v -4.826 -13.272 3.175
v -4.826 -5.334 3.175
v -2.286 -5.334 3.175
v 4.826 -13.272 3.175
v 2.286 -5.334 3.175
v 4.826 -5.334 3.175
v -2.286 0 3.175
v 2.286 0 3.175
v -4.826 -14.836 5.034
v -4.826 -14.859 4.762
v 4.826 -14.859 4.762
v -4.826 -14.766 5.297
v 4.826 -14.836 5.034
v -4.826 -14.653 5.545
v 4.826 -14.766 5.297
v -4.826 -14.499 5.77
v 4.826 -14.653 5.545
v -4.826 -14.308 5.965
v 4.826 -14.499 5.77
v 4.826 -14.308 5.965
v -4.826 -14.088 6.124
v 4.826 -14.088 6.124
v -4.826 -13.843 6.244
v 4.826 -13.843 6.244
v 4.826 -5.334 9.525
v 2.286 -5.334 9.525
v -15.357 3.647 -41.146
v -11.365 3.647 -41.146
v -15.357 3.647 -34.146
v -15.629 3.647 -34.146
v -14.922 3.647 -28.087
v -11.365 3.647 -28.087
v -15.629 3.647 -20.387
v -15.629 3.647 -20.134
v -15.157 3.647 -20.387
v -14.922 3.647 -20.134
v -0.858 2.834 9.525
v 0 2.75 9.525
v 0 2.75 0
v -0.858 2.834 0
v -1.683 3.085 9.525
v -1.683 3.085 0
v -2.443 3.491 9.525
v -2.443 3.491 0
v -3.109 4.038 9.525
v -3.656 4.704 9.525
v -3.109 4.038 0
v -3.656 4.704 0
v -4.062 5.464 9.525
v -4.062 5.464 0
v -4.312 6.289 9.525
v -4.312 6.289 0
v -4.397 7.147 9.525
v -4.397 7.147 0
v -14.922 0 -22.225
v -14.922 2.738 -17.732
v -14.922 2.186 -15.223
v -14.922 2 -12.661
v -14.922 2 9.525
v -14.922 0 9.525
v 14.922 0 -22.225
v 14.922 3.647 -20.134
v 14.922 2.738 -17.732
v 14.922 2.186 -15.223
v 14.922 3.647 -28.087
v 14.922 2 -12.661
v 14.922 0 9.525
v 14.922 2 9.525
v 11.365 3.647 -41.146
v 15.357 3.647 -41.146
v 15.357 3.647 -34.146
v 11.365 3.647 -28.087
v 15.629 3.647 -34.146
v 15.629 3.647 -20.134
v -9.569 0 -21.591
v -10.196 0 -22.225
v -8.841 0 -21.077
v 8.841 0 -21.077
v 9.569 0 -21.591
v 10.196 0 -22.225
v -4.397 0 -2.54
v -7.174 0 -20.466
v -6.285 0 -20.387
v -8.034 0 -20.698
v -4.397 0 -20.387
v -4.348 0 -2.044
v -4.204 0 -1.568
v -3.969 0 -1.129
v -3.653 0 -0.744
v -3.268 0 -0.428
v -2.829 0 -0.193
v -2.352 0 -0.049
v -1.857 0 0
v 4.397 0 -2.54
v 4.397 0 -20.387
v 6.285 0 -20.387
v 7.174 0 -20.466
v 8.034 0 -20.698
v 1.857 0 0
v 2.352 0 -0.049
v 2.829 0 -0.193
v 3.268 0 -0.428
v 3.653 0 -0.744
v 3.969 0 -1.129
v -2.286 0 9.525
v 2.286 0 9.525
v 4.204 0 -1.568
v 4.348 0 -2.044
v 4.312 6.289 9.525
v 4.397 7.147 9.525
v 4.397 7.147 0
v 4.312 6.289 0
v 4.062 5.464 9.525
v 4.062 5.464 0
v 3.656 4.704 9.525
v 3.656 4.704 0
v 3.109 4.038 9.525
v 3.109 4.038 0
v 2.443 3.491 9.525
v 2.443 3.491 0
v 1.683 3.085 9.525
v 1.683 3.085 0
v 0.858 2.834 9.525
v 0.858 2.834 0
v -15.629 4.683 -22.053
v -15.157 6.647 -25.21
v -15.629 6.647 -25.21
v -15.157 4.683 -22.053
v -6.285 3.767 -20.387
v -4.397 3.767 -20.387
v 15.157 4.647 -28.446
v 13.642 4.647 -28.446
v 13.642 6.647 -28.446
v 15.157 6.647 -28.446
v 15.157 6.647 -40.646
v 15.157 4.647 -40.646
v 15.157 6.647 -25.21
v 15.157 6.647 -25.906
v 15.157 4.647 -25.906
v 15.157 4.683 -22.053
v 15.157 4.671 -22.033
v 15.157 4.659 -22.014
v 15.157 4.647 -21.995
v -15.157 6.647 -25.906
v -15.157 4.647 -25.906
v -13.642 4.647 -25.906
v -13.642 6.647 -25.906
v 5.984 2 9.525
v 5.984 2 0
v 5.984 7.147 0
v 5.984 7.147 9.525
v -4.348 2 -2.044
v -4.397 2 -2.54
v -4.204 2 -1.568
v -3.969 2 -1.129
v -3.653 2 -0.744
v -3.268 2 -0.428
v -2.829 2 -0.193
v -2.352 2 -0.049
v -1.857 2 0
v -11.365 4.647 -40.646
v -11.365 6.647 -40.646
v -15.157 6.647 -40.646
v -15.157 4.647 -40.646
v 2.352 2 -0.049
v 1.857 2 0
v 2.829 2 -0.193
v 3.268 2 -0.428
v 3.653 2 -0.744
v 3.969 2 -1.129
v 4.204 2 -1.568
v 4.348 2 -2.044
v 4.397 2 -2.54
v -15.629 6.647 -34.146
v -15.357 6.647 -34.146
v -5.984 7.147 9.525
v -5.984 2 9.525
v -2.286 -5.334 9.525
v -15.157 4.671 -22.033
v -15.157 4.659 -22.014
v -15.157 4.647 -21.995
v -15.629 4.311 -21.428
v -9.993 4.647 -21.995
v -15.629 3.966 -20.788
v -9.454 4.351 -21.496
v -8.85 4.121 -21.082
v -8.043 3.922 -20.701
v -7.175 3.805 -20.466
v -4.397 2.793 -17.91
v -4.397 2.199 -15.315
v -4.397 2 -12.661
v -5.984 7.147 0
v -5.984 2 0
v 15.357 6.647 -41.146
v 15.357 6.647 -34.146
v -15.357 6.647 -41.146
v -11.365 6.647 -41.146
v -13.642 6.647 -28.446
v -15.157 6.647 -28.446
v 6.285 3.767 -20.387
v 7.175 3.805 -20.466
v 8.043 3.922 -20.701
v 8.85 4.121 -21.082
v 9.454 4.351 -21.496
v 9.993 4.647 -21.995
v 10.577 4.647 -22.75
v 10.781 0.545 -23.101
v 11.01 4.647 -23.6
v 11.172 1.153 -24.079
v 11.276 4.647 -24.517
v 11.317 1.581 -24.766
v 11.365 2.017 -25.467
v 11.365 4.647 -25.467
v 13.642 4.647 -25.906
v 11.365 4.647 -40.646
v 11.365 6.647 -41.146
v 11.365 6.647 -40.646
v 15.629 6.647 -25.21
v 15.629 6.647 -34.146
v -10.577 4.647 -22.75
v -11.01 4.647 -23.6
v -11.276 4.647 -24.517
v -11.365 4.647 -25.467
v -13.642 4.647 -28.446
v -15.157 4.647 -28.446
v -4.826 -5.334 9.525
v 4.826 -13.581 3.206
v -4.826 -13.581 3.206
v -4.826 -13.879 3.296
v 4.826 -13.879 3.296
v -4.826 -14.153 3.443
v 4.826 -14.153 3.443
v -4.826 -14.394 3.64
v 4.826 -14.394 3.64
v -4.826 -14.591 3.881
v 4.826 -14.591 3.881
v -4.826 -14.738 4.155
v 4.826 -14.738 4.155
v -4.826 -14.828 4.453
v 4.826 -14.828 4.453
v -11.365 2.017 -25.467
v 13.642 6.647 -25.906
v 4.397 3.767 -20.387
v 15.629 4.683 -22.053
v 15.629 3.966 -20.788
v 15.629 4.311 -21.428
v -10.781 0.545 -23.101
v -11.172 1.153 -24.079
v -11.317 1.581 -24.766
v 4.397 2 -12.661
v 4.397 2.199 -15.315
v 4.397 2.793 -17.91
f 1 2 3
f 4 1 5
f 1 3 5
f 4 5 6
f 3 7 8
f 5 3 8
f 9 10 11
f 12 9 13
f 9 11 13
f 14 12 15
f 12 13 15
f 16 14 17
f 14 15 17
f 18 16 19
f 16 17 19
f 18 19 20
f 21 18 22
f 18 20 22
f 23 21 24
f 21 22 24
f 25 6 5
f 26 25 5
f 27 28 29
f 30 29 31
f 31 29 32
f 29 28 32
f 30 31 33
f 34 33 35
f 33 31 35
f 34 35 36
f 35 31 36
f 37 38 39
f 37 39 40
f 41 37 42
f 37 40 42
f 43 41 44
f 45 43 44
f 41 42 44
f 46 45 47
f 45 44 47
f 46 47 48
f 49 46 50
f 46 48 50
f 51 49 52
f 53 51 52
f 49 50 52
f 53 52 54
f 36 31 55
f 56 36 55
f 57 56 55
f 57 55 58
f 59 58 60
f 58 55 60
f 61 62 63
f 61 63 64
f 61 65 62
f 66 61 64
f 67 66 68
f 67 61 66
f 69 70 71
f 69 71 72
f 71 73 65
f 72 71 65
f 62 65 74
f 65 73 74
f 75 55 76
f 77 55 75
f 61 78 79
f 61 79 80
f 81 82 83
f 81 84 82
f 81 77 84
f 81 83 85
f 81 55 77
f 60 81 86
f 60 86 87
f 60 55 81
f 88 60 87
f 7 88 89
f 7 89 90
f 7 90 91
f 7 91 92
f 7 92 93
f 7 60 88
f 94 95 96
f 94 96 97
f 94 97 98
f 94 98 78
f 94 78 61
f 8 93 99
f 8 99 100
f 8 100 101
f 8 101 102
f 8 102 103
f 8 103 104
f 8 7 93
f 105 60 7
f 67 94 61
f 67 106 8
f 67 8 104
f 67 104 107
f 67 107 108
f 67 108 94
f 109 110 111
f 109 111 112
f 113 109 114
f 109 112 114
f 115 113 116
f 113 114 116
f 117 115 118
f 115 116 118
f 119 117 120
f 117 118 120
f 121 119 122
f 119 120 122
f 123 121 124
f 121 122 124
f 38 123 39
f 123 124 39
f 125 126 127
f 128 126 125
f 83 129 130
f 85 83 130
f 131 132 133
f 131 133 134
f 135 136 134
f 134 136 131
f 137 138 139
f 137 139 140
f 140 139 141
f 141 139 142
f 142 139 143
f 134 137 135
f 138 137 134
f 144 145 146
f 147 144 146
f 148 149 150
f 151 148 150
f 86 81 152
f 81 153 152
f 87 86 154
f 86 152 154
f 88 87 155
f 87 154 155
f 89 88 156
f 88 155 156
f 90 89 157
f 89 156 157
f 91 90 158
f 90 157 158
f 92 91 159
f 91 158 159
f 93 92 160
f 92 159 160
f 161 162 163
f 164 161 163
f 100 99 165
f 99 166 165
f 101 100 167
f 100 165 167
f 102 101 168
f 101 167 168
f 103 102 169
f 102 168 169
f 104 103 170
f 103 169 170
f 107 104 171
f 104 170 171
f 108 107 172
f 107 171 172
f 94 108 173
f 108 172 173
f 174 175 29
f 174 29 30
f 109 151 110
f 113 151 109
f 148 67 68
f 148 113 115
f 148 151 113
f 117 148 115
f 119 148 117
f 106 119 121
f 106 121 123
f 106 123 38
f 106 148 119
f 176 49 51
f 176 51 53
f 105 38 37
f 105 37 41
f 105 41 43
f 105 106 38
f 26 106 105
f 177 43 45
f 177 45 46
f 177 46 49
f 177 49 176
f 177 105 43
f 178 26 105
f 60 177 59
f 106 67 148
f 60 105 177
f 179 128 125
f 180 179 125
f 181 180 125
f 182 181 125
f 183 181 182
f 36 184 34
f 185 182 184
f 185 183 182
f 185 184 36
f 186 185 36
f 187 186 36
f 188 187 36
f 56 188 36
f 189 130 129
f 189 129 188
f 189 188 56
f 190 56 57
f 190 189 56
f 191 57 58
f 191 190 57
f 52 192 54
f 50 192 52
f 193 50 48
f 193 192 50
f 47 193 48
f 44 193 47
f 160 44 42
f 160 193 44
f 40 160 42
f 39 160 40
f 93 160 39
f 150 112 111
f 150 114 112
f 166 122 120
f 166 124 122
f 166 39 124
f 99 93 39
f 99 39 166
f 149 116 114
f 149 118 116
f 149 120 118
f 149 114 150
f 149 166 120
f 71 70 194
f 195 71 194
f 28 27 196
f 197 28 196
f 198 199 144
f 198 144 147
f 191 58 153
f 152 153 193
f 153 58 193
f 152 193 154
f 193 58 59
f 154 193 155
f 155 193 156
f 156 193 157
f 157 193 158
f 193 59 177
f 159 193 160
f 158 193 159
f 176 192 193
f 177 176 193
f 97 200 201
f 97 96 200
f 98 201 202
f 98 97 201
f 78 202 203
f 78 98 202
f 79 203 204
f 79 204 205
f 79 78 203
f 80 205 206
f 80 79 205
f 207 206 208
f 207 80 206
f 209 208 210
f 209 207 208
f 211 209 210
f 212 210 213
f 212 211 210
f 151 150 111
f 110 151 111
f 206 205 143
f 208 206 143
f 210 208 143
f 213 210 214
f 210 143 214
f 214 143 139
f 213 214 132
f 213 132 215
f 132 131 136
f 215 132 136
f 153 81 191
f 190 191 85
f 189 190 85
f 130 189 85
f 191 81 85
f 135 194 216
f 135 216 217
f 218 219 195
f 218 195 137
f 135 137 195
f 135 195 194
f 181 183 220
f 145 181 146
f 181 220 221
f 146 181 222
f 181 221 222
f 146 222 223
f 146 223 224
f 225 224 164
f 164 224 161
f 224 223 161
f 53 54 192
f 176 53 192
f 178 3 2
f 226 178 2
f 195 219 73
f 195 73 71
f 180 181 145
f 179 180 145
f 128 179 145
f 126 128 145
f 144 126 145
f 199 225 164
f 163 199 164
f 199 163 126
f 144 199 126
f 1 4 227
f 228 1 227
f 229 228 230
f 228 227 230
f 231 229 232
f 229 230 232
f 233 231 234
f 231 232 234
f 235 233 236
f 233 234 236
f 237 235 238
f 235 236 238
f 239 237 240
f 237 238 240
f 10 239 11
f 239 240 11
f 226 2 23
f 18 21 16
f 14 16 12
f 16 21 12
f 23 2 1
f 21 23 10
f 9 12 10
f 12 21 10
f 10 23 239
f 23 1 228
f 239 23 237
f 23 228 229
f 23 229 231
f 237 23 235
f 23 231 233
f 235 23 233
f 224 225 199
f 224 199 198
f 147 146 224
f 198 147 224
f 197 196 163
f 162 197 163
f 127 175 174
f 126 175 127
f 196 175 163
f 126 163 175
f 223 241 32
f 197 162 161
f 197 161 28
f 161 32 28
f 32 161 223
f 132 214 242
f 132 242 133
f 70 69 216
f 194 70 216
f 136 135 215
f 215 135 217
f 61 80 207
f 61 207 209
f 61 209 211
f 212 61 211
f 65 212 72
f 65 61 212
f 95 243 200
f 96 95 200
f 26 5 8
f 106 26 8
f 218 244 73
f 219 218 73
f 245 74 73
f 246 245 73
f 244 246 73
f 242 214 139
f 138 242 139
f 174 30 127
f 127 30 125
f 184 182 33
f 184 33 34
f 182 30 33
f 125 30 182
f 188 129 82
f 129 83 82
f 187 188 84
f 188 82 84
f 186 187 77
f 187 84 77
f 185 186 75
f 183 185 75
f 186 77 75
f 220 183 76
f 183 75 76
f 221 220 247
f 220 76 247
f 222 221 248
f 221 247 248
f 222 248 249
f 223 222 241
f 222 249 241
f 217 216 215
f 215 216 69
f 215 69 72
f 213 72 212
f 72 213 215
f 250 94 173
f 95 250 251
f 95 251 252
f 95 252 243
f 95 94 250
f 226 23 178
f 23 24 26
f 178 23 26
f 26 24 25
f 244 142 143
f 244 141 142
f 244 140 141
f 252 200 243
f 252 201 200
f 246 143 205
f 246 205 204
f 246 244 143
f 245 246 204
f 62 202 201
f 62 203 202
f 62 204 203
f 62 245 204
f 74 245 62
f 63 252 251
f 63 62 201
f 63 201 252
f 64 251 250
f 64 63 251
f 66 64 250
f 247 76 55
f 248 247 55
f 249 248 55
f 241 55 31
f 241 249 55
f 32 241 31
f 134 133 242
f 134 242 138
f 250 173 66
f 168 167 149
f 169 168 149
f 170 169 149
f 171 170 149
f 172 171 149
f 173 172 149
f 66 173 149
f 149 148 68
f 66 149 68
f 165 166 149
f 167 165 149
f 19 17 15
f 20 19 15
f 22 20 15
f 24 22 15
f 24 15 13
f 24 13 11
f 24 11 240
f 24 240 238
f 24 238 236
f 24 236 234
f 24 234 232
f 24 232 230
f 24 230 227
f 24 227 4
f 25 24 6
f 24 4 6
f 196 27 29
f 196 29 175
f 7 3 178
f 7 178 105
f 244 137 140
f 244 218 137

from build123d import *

# Parameters (mm, degrees)
SKETCH2_W               = 11.9687594
SKETCH2_H               = 2.75
BOSS_EXTRUDE1_DEPTH     = 9.525
BOSS_EXTRUDE2_START     = 3.175
SKETCH2_3_W             = 11.9687594
SKETCH2_3_H             = 2.75
SKETCH2_3_W_2           = 4.572
SKETCH2_3_H_2           = 5.334
BOSS_EXTRUDE2_DEPTH     = 6.35
BOSS_EXTRUDE3_DEPTH     = 2
BOSS_EXTRUDE7_DEPTH     = 25.4
SKETCH5_W               = 9.771111266
SKETCH5_H               = 3
CUT_EXTRUDE1_DEPTH      = 78.484078326
SKETCH6_W               = 30.314979468
SKETCH6_H               = 2.000002
SKETCH6_W_2             = 22.73097918
SKETCH6_H_2             = 6.646875
CUT_EXTRUDE2_DEPTH      = 20.258872
CUT_EXTRUDE3_START      = 0.499999
SKETCH6_3_W             = 22.73097918
SKETCH6_3_H             = 2.000002
SKETCH6_3_H_2           = 4.646873
SKETCH6_3_W_2           = 0.271399
SKETCH6_3_H_3           = 3
CUT_EXTRUDE3_DEPTH      = 7.0000114
FILLET2_R               = 17.78
CUT_EXTRUDE4_DEPTH      = 48.132860149
CUT_EXTRUDE4_DEPTH_BACK = 48.132860149
SKETCH7_W               = 8.7937594
SKETCH7_H               = 20.387434944
FILLET3_R               = 2.54
SKETCH8_W               = 1.515000072
SKETCH8_H               = 2.54
BOSS_EXTRUDE8_DEPTH     = 2
FILLET4_R               = 5.08
CUT_EXTRUDE5_DEPTH      = 49.292968639


with BuildPart() as part:
    # Sketch2 → Boss-Extrude1 (new body)
    with BuildSketch(Plane.XY):
        with BuildLine():
            ThreePointArc((-9e-09, 2.75), (-3.109063455, 4.037816251), (-4.3968797, 7.1468797))
            Line((-4.3968797, 7.1468797), (-5.9843797, 7.1468797))
            Line((-5.9843797, 7.1468797), (-5.9843797, 2.75))
            Line((-5.9843797, 2.75), (-9e-09, 2.75))
        make_face()
        with BuildLine():
            Line((5.9843797, 7.1468797), (4.3968797, 7.1468797))
            ThreePointArc((4.3968797, 7.1468797), (3.109063449, 4.037816245), (-9e-09, 2.75))
            Line((-9e-09, 2.75), (5.9843797, 2.75))
            Line((5.9843797, 2.75), (5.9843797, 7.1468797))
        make_face()
        with Locations((0, 1.375)):
            Rectangle(SKETCH2_W, SKETCH2_H)
    extrude(amount=BOSS_EXTRUDE1_DEPTH)

    # Sketch2<3> → Boss-Extrude2 (add)
    with BuildSketch(Plane.XY.offset(BOSS_EXTRUDE2_START)):
        with Locations((0, 1.375)):
            Rectangle(SKETCH2_3_W, SKETCH2_3_H)
        with BuildLine():
            ThreePointArc((-9e-09, 2.75), (-3.109063455, 4.037816251), (-4.3968797, 7.1468797))
            Line((-4.3968797, 7.1468797), (-5.9843797, 7.1468797))
            Line((-5.9843797, 7.1468797), (-5.9843797, 2.75))
            Line((-5.9843797, 2.75), (-9e-09, 2.75))
        make_face()
        with BuildLine():
            Line((5.9843797, 7.1468797), (4.3968797, 7.1468797))
            ThreePointArc((4.3968797, 7.1468797), (3.109063449, 4.037816245), (-9e-09, 2.75))
            Line((-9e-09, 2.75), (5.9843797, 2.75))
            Line((5.9843797, 2.75), (5.9843797, 7.1468797))
        make_face()
        with Locations((0, -2.667)):
            Rectangle(SKETCH2_3_W_2, SKETCH2_3_H_2)
        Polygon((2.286, -5.334), (-2.286, -5.334), (-4.826, -5.334), (-4.826, -14.859), (4.826, -14.859), (4.826, -5.334), align=None)
    extrude(amount=BOSS_EXTRUDE2_DEPTH)

    # Sketch3 → Boss-Extrude3 (add)
    with BuildSketch(Plane.XZ):
        Polygon((14.9225, 9.525), (-14.9225, 9.525), (-14.9225, -22.225), (-10.85748959, -22.225), (10.85748959, -22.225), (14.9225, -22.225), align=None)
    extrude(amount=-BOSS_EXTRUDE3_DEPTH)

    # Sketch4<6> → Boss-Extrude7 (add, symmetric)
    with BuildSketch(Plane(origin=(0, 0, 0), x_dir=(0, 0, -1), z_dir=(1, 0, 0))):
        Polygon((28.087296632, 3.646875), (41.146305566, 3.646875), (41.146305566, 6.646875), (25.209889757, 6.646875), (17.740108187, 2), (22.225, 0), align=None)
    extrude(amount=BOSS_EXTRUDE7_DEPTH, both=True)

    # Sketch5 → Cut-Extrude1 (cut, through all)
    with BuildSketch(Plane(origin=(0, 37.971305566, -41.146305566), x_dir=(1, 0, 0), z_dir=(0, 0, 1))):
        Polygon((25.4, -37.971305566), (25.4, -34.324430566), (15.628888734, -34.324430566), (14.9225, -34.324430566), (14.9225, -37.971305566), align=None)
        with Locations((20.514444367, -32.824430566)):
            Rectangle(SKETCH5_W, SKETCH5_H)
        Polygon((-25.4, -34.324430566), (-25.4, -37.971305566), (-14.9225, -37.971305566), (-14.9225, -34.324430566), (-15.628888734, -34.324430566), align=None)
        with Locations((-20.514444367, -32.824430566)):
            Rectangle(SKETCH5_W, SKETCH5_H)
    extrude(amount=CUT_EXTRUDE1_DEPTH, mode=Mode.SUBTRACT)

    # Sketch6 → Cut-Extrude2 (cut)
    with BuildSketch(Plane(origin=(0, 0, -40.646306566), x_dir=(-1, 0, 0), z_dir=(0, 0, -1))):
        with Locations((0, 5.646874)):
            Rectangle(SKETCH6_W, SKETCH6_H)
        with Locations((0, 3.3234375)):
            Rectangle(SKETCH6_W_2, SKETCH6_H_2)
    extrude(amount=-CUT_EXTRUDE2_DEPTH, mode=Mode.SUBTRACT)

    # Sketch6<3> → Cut-Extrude3 (cut)
    with BuildSketch(Plane(origin=(0, 0, -40.646306566), x_dir=(-1, 0, 0), z_dir=(0, 0, -1)).offset(CUT_EXTRUDE3_START)):
        with Locations((0, 5.646874)):
            Rectangle(SKETCH6_3_W, SKETCH6_3_H)
        with Locations((0, 2.3234365)):
            Rectangle(SKETCH6_3_W, SKETCH6_3_H_2)
        with Locations((-15.493189234, 5.146875)):
            Rectangle(SKETCH6_3_W_2, SKETCH6_3_H_3)
        with Locations((15.493189234, 5.146875)):
            Rectangle(SKETCH6_3_W_2, SKETCH6_3_H_3)
    extrude(amount=-CUT_EXTRUDE3_DEPTH, mode=Mode.SUBTRACT)

    # Fillet2
    # the kernel refuses this fillet: 17.78 mm, written as the material it adds along each edge
    with BuildSketch(Plane(origin=(27.620205217, 2, -17.740108187), x_dir=(0, 0.5282208325858079, -0.8491070321357349), z_dir=(-1, 0, 0))) as fillet2_piece_1_section:
        with BuildLine():
            CenterArc((FILLET2_R * 0.285662659546, -FILLET2_R), FILLET2_R, 90, 31.885322289)
            Line((-FILLET2_R * 0.242558173039, -FILLET2_R * 0.150892967864), (0, 0))
            Line((0, 0), (FILLET2_R * 0.285662659546, 0))
        make_face()
    fillet2_piece_1 = extrude(amount=55.240410434, mode=Mode.PRIVATE)
    fillet2_piece_1 = split(fillet2_piece_1, bisect_by=Plane(origin=(15.393189234, 3.646875, -22.00929754), z_dir=(0, 1, 0)), keep=Keep.TOP, mode=Mode.PRIVATE)
    fillet2_piece_1 = split(fillet2_piece_1, bisect_by=Plane(origin=(15.628888734, 4.655865618, -22.00929754), z_dir=(-1, 0, 0)), keep=Keep.TOP, mode=Mode.PRIVATE)
    fillet2_piece_1 = split(fillet2_piece_1, bisect_by=Plane(origin=(15.157489734, 4.655865618, -22.00929754), z_dir=(1, 0, 0)), keep=Keep.TOP, mode=Mode.PRIVATE)
    add(fillet2_piece_1)
    with BuildSketch(Plane(origin=(27.620205217, 2, -17.740108187), x_dir=(0, 0.5282208325858079, -0.8491070321357349), z_dir=(-1, 0, 0))) as fillet2_piece_2_section:
        with BuildLine():
            CenterArc((FILLET2_R * 0.285662659546, -FILLET2_R), FILLET2_R, 90, 31.885322289)
            Line((-FILLET2_R * 0.242558173039, -FILLET2_R * 0.150892967864), (0, 0))
            Line((0, 0), (FILLET2_R * 0.285662659546, 0))
        make_face()
    fillet2_piece_2 = extrude(amount=55.240410434, mode=Mode.PRIVATE)
    fillet2_piece_2 = split(fillet2_piece_2, bisect_by=Plane(origin=(15.039994889, 3.646875, -20.807533434), z_dir=(0, 1, 0)), keep=Keep.TOP, mode=Mode.PRIVATE)
    fillet2_piece_2 = split(fillet2_piece_2, bisect_by=Plane(origin=(15.157489734, 3.944287392, -20.807533434), z_dir=(-1, 0, 0)), keep=Keep.TOP, mode=Mode.PRIVATE)
    fillet2_piece_2 = split(fillet2_piece_2, bisect_by=Plane(origin=(15.039994889, 4.646873, -20.807533434), z_dir=(0, -1, 0)), keep=Keep.TOP, mode=Mode.PRIVATE)
    fillet2_piece_2 = split(fillet2_piece_2, bisect_by=Plane(origin=(11.36548959, 3.944287392, -20.807533434), z_dir=(1, 0, 0)), keep=Keep.TOP, mode=Mode.PRIVATE)
    add(fillet2_piece_2)
    with BuildSketch(Plane(origin=(14.9225, 2, -17.740108187), x_dir=(0, 0.528220832585808, -0.8491070321357348), z_dir=(-1, 0, 0))) as fillet2_piece_3_section:
        with BuildLine():
            CenterArc((FILLET2_R * 0.285662659546, -FILLET2_R), FILLET2_R, 90, 31.885322289)
            Line((-FILLET2_R * 0.242558173039, -FILLET2_R * 0.150892967864), (0, 0))
            Line((0, 0), (FILLET2_R * 0.285662659546, 0))
        make_face()
    fillet2_piece_3 = extrude(amount=29.845, mode=Mode.PRIVATE)
    fillet2_piece_3 = split(fillet2_piece_3, bisect_by=Plane(origin=(13.143994801, 2.494402422, -20.387434566), z_dir=(0, 0, 1)), keep=Keep.TOP, mode=Mode.PRIVATE)
    add(fillet2_piece_3)
    with BuildSketch(Plane(origin=(27.620205217, 2, -17.740108187), x_dir=(0, 0.5282208325858079, -0.8491070321357349), z_dir=(-1, 0, 0))) as fillet2_piece_4_section:
        with BuildLine():
            CenterArc((FILLET2_R * 0.285662659546, -FILLET2_R), FILLET2_R, 90, 31.885322289)
            Line((-FILLET2_R * 0.242558173039, -FILLET2_R * 0.150892967864), (0, 0))
            Line((0, 0), (FILLET2_R * 0.285662659546, 0))
        make_face()
    fillet2_piece_4 = extrude(amount=55.240410434, mode=Mode.PRIVATE)
    fillet2_piece_4 = split(fillet2_piece_4, bisect_by=Plane(origin=(-15.628888734, 3.94428727, -20.807533615), z_dir=(1, 0, 0)), keep=Keep.TOP, mode=Mode.PRIVATE)
    fillet2_piece_4 = split(fillet2_piece_4, bisect_by=Plane(origin=(-13.143995303, 3.646875, -20.807533615), z_dir=(0, 1, 0)), keep=Keep.TOP, mode=Mode.PRIVATE)
    fillet2_piece_4 = split(fillet2_piece_4, bisect_by=Plane(origin=(-13.143995303, 4.646873, -20.807533615), z_dir=(0, -1, 0)), keep=Keep.TOP, mode=Mode.PRIVATE)
    fillet2_piece_4 = split(fillet2_piece_4, bisect_by=Plane(origin=(-11.36548959, 3.94428727, -20.807533615), z_dir=(-1, 0, 0)), keep=Keep.TOP, mode=Mode.PRIVATE)
    add(fillet2_piece_4)
    with BuildSketch(Plane(origin=(27.620205217, 2, -17.740108187), x_dir=(0, 0.5282208325858079, -0.8491070321357349), z_dir=(-1, 0, 0))) as fillet2_piece_5_section:
        with BuildLine():
            CenterArc((FILLET2_R * 0.285662659546, -FILLET2_R), FILLET2_R, 90, 31.885322289)
            Line((-FILLET2_R * 0.242558173039, -FILLET2_R * 0.150892967864), (0, 0))
            Line((0, 0), (FILLET2_R * 0.285662659546, 0))
        make_face()
    fillet2_piece_5 = extrude(amount=55.240410434, mode=Mode.PRIVATE)
    fillet2_piece_5 = split(fillet2_piece_5, bisect_by=Plane(origin=(-15.628888734, 4.655865618, -22.00929754), z_dir=(1, 0, 0)), keep=Keep.TOP, mode=Mode.PRIVATE)
    fillet2_piece_5 = split(fillet2_piece_5, bisect_by=Plane(origin=(-15.393189234, 4.655865618, -20.387434566), z_dir=(0, 0, -1)), keep=Keep.TOP, mode=Mode.PRIVATE)
    fillet2_piece_5 = split(fillet2_piece_5, bisect_by=Plane(origin=(-15.157489734, 4.655865618, -22.00929754), z_dir=(-1, 0, 0)), keep=Keep.TOP, mode=Mode.PRIVATE)
    add(fillet2_piece_5)

    # Sketch7 → Cut-Extrude4 (cut, two sides: drawn at the far end of the back side and taken through both)
    with BuildSketch(Plane(origin=(0, 2, 0), x_dir=(1, 0, 0), z_dir=(0, 1, 0)).offset(-CUT_EXTRUDE4_DEPTH_BACK)):
        with Locations((0, 10.193717472)):
            Rectangle(SKETCH7_W, SKETCH7_H)
    extrude(amount=CUT_EXTRUDE4_DEPTH + CUT_EXTRUDE4_DEPTH_BACK, mode=Mode.SUBTRACT)

    # Fillet3
    fillet3_edges = [part.edges().sort_by_distance(p)[0] for p in [
        (4.3968797, 1, 0),
        (-4.3968797, 1, 0),
    ]]
    fillet(fillet3_edges, radius=FILLET3_R)

    # Sketch8 → Boss-Extrude8 (add)
    with BuildSketch(Plane(origin=(0, 4.646873, 0), x_dir=(1, 0, 0), z_dir=(0, 1, 0))):
        with Locations((-14.399989698, 27.176306566)):
            Rectangle(SKETCH8_W, SKETCH8_H)
        with Locations((14.399989698, 27.176306566)):
            Rectangle(SKETCH8_W, SKETCH8_H)
    extrude(amount=BOSS_EXTRUDE8_DEPTH)

    # Fillet4
    fillet4_edges = [part.edges().sort_by_distance(p)[0] for p in [
        (11.36548959, 1.883268266, -20.387434566),
        (-11.36548959, 1.883268266, -20.387434566),
    ]]
    fillet(fillet4_edges, radius=FILLET4_R)

    # Sketch10 → Cut-Extrude5 (cut, through all)
    with BuildSketch(Plane(origin=(4.826, 0, 0), x_dir=(0, 0, -1), z_dir=(1, 0, 0))):
        with BuildLine():
            Line((-6.243675471, -13.842705282), (-9.525, -5.334))
            Line((-9.525, -5.334), (-9.525, -14.859))
            Line((-9.525, -14.859), (-4.7625, -14.859))
            ThreePointArc((-4.7625, -14.859), (-5.660655851, -14.580496684), (-6.243675471, -13.842705282))
        make_face()
        with BuildLine():
            ThreePointArc((-3.175, -13.2715), (-3.639967985, -14.394032015), (-4.7625, -14.859))
            Line((-4.7625, -14.859), (-3.175, -14.859))
            Line((-3.175, -14.859), (-3.175, -13.2715))
        make_face()
    extrude(amount=-CUT_EXTRUDE5_DEPTH, mode=Mode.SUBTRACT)


solid = part.part
